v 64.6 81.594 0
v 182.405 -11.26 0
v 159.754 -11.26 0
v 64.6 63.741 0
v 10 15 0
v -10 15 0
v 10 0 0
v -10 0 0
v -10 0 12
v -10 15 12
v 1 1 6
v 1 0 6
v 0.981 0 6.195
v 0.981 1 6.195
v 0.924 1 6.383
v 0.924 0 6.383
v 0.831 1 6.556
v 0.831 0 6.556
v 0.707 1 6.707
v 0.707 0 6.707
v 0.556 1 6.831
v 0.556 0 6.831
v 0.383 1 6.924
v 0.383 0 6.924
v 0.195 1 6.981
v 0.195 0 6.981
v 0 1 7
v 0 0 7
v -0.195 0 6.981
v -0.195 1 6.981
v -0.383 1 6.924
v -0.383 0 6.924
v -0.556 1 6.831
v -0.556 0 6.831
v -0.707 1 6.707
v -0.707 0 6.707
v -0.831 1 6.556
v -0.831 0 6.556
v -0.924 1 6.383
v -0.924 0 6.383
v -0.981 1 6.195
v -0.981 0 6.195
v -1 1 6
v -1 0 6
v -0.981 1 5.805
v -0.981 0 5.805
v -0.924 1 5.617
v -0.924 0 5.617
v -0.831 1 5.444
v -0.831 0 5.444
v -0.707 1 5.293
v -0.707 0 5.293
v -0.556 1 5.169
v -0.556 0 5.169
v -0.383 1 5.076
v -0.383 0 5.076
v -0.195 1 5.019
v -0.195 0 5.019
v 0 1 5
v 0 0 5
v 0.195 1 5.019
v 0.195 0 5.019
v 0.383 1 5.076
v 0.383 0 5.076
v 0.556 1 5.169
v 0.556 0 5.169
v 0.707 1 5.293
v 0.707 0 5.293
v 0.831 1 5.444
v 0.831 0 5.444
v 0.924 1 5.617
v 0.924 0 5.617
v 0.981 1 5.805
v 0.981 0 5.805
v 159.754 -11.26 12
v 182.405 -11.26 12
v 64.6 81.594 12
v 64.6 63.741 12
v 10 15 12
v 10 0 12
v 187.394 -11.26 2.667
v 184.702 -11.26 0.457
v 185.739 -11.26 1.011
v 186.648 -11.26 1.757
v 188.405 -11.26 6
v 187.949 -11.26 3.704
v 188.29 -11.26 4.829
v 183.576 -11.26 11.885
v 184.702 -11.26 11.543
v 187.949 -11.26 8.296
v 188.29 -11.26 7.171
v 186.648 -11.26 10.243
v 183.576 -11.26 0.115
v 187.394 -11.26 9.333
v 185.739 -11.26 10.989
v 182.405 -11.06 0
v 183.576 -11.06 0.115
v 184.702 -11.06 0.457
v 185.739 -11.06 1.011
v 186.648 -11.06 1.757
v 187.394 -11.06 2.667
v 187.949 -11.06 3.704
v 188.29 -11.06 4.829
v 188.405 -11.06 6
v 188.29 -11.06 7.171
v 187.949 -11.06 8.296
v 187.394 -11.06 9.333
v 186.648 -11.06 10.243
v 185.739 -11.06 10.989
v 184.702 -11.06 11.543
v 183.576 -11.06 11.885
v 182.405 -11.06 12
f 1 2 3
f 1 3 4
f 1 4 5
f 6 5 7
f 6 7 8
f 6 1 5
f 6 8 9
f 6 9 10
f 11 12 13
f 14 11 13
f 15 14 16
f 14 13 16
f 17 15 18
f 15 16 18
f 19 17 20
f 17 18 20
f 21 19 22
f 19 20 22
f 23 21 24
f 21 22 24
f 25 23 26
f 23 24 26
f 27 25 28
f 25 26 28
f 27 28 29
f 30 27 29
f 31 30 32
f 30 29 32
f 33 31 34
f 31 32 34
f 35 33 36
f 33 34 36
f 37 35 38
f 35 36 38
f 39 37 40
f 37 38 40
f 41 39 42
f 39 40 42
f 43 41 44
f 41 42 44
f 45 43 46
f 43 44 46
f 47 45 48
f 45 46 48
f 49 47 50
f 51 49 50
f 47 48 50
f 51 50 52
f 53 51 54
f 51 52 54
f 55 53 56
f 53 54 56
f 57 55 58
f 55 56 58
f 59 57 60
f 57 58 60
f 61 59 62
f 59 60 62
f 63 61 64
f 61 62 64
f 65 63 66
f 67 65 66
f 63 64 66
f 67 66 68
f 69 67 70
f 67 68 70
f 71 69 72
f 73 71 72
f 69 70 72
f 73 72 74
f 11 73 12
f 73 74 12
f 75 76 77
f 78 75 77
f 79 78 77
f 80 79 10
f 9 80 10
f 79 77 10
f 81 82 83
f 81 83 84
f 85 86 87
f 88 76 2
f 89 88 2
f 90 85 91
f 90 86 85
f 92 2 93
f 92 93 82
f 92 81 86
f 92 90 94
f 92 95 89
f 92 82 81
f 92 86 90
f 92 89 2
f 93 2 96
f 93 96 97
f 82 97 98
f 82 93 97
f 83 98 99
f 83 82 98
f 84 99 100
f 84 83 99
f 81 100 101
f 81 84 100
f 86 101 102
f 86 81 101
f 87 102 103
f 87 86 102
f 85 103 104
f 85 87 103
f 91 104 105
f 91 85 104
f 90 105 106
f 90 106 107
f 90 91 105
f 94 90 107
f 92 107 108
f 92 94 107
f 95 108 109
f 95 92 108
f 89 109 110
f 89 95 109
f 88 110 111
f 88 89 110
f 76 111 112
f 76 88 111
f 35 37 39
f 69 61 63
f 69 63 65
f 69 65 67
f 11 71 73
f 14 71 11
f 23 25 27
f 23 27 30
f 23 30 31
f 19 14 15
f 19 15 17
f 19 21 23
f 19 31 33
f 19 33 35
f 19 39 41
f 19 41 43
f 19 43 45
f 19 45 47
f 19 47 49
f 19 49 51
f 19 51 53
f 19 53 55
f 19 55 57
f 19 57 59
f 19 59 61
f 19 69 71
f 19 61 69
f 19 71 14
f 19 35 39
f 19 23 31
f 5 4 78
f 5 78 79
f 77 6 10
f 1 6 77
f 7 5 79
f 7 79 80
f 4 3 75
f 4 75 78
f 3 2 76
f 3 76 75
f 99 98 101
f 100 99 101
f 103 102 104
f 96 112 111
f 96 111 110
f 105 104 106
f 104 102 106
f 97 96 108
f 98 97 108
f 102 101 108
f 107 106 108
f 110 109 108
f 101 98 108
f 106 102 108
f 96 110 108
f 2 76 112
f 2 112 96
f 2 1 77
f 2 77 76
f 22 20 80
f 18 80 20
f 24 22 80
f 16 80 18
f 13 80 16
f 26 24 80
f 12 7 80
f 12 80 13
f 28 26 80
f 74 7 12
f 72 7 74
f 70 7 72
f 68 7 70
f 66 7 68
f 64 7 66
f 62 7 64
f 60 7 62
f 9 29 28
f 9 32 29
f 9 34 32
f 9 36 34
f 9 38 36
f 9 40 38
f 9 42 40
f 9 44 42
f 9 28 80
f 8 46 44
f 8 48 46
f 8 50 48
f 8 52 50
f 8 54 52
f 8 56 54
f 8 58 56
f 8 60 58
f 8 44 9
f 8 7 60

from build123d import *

# Parameters (mm, degrees)
BOSS_EXTRUDE1_DEPTH = 12
BOSS_EXTRUDE2_DEPTH = 0.2
SKETCH4_R           = 1
CUT_EXTRUDE1_DEPTH  = 1


with BuildPart() as part:
    # Sketch1 → Boss-Extrude1 (new body)
    with BuildSketch(Plane.XY):
        Polygon((-10, 0), (-10, 15), (64.600301578, 81.594256543), (182.405421436, -11.260219575), (159.754414724, -11.260219575), (64.600301578, 63.740640637), (10, 15), (10, 0), align=None)
    extrude(amount=BOSS_EXTRUDE1_DEPTH)

    # Sketch4 → Cut-Extrude1 (cut)
    with BuildSketch(Plane.XZ):
        with Locations((0, 6)):
            Circle(SKETCH4_R)
    extrude(amount=-CUT_EXTRUDE1_DEPTH, mode=Mode.SUBTRACT)


with BuildPart() as body_2:
    # Sketch3 → Boss-Extrude2 (new body)
    with BuildSketch(Plane.XZ.offset(11.260219575)):
        with BuildLine():
            Line((182.405421436, 12), (182.405421436, 0))
            ThreePointArc((182.405421436, 0), (188.405421436, 6), (182.405421436, 12))
        make_face()
    extrude(amount=-BOSS_EXTRUDE2_DEPTH)


solid = Compound([part.part, body_2.part])
